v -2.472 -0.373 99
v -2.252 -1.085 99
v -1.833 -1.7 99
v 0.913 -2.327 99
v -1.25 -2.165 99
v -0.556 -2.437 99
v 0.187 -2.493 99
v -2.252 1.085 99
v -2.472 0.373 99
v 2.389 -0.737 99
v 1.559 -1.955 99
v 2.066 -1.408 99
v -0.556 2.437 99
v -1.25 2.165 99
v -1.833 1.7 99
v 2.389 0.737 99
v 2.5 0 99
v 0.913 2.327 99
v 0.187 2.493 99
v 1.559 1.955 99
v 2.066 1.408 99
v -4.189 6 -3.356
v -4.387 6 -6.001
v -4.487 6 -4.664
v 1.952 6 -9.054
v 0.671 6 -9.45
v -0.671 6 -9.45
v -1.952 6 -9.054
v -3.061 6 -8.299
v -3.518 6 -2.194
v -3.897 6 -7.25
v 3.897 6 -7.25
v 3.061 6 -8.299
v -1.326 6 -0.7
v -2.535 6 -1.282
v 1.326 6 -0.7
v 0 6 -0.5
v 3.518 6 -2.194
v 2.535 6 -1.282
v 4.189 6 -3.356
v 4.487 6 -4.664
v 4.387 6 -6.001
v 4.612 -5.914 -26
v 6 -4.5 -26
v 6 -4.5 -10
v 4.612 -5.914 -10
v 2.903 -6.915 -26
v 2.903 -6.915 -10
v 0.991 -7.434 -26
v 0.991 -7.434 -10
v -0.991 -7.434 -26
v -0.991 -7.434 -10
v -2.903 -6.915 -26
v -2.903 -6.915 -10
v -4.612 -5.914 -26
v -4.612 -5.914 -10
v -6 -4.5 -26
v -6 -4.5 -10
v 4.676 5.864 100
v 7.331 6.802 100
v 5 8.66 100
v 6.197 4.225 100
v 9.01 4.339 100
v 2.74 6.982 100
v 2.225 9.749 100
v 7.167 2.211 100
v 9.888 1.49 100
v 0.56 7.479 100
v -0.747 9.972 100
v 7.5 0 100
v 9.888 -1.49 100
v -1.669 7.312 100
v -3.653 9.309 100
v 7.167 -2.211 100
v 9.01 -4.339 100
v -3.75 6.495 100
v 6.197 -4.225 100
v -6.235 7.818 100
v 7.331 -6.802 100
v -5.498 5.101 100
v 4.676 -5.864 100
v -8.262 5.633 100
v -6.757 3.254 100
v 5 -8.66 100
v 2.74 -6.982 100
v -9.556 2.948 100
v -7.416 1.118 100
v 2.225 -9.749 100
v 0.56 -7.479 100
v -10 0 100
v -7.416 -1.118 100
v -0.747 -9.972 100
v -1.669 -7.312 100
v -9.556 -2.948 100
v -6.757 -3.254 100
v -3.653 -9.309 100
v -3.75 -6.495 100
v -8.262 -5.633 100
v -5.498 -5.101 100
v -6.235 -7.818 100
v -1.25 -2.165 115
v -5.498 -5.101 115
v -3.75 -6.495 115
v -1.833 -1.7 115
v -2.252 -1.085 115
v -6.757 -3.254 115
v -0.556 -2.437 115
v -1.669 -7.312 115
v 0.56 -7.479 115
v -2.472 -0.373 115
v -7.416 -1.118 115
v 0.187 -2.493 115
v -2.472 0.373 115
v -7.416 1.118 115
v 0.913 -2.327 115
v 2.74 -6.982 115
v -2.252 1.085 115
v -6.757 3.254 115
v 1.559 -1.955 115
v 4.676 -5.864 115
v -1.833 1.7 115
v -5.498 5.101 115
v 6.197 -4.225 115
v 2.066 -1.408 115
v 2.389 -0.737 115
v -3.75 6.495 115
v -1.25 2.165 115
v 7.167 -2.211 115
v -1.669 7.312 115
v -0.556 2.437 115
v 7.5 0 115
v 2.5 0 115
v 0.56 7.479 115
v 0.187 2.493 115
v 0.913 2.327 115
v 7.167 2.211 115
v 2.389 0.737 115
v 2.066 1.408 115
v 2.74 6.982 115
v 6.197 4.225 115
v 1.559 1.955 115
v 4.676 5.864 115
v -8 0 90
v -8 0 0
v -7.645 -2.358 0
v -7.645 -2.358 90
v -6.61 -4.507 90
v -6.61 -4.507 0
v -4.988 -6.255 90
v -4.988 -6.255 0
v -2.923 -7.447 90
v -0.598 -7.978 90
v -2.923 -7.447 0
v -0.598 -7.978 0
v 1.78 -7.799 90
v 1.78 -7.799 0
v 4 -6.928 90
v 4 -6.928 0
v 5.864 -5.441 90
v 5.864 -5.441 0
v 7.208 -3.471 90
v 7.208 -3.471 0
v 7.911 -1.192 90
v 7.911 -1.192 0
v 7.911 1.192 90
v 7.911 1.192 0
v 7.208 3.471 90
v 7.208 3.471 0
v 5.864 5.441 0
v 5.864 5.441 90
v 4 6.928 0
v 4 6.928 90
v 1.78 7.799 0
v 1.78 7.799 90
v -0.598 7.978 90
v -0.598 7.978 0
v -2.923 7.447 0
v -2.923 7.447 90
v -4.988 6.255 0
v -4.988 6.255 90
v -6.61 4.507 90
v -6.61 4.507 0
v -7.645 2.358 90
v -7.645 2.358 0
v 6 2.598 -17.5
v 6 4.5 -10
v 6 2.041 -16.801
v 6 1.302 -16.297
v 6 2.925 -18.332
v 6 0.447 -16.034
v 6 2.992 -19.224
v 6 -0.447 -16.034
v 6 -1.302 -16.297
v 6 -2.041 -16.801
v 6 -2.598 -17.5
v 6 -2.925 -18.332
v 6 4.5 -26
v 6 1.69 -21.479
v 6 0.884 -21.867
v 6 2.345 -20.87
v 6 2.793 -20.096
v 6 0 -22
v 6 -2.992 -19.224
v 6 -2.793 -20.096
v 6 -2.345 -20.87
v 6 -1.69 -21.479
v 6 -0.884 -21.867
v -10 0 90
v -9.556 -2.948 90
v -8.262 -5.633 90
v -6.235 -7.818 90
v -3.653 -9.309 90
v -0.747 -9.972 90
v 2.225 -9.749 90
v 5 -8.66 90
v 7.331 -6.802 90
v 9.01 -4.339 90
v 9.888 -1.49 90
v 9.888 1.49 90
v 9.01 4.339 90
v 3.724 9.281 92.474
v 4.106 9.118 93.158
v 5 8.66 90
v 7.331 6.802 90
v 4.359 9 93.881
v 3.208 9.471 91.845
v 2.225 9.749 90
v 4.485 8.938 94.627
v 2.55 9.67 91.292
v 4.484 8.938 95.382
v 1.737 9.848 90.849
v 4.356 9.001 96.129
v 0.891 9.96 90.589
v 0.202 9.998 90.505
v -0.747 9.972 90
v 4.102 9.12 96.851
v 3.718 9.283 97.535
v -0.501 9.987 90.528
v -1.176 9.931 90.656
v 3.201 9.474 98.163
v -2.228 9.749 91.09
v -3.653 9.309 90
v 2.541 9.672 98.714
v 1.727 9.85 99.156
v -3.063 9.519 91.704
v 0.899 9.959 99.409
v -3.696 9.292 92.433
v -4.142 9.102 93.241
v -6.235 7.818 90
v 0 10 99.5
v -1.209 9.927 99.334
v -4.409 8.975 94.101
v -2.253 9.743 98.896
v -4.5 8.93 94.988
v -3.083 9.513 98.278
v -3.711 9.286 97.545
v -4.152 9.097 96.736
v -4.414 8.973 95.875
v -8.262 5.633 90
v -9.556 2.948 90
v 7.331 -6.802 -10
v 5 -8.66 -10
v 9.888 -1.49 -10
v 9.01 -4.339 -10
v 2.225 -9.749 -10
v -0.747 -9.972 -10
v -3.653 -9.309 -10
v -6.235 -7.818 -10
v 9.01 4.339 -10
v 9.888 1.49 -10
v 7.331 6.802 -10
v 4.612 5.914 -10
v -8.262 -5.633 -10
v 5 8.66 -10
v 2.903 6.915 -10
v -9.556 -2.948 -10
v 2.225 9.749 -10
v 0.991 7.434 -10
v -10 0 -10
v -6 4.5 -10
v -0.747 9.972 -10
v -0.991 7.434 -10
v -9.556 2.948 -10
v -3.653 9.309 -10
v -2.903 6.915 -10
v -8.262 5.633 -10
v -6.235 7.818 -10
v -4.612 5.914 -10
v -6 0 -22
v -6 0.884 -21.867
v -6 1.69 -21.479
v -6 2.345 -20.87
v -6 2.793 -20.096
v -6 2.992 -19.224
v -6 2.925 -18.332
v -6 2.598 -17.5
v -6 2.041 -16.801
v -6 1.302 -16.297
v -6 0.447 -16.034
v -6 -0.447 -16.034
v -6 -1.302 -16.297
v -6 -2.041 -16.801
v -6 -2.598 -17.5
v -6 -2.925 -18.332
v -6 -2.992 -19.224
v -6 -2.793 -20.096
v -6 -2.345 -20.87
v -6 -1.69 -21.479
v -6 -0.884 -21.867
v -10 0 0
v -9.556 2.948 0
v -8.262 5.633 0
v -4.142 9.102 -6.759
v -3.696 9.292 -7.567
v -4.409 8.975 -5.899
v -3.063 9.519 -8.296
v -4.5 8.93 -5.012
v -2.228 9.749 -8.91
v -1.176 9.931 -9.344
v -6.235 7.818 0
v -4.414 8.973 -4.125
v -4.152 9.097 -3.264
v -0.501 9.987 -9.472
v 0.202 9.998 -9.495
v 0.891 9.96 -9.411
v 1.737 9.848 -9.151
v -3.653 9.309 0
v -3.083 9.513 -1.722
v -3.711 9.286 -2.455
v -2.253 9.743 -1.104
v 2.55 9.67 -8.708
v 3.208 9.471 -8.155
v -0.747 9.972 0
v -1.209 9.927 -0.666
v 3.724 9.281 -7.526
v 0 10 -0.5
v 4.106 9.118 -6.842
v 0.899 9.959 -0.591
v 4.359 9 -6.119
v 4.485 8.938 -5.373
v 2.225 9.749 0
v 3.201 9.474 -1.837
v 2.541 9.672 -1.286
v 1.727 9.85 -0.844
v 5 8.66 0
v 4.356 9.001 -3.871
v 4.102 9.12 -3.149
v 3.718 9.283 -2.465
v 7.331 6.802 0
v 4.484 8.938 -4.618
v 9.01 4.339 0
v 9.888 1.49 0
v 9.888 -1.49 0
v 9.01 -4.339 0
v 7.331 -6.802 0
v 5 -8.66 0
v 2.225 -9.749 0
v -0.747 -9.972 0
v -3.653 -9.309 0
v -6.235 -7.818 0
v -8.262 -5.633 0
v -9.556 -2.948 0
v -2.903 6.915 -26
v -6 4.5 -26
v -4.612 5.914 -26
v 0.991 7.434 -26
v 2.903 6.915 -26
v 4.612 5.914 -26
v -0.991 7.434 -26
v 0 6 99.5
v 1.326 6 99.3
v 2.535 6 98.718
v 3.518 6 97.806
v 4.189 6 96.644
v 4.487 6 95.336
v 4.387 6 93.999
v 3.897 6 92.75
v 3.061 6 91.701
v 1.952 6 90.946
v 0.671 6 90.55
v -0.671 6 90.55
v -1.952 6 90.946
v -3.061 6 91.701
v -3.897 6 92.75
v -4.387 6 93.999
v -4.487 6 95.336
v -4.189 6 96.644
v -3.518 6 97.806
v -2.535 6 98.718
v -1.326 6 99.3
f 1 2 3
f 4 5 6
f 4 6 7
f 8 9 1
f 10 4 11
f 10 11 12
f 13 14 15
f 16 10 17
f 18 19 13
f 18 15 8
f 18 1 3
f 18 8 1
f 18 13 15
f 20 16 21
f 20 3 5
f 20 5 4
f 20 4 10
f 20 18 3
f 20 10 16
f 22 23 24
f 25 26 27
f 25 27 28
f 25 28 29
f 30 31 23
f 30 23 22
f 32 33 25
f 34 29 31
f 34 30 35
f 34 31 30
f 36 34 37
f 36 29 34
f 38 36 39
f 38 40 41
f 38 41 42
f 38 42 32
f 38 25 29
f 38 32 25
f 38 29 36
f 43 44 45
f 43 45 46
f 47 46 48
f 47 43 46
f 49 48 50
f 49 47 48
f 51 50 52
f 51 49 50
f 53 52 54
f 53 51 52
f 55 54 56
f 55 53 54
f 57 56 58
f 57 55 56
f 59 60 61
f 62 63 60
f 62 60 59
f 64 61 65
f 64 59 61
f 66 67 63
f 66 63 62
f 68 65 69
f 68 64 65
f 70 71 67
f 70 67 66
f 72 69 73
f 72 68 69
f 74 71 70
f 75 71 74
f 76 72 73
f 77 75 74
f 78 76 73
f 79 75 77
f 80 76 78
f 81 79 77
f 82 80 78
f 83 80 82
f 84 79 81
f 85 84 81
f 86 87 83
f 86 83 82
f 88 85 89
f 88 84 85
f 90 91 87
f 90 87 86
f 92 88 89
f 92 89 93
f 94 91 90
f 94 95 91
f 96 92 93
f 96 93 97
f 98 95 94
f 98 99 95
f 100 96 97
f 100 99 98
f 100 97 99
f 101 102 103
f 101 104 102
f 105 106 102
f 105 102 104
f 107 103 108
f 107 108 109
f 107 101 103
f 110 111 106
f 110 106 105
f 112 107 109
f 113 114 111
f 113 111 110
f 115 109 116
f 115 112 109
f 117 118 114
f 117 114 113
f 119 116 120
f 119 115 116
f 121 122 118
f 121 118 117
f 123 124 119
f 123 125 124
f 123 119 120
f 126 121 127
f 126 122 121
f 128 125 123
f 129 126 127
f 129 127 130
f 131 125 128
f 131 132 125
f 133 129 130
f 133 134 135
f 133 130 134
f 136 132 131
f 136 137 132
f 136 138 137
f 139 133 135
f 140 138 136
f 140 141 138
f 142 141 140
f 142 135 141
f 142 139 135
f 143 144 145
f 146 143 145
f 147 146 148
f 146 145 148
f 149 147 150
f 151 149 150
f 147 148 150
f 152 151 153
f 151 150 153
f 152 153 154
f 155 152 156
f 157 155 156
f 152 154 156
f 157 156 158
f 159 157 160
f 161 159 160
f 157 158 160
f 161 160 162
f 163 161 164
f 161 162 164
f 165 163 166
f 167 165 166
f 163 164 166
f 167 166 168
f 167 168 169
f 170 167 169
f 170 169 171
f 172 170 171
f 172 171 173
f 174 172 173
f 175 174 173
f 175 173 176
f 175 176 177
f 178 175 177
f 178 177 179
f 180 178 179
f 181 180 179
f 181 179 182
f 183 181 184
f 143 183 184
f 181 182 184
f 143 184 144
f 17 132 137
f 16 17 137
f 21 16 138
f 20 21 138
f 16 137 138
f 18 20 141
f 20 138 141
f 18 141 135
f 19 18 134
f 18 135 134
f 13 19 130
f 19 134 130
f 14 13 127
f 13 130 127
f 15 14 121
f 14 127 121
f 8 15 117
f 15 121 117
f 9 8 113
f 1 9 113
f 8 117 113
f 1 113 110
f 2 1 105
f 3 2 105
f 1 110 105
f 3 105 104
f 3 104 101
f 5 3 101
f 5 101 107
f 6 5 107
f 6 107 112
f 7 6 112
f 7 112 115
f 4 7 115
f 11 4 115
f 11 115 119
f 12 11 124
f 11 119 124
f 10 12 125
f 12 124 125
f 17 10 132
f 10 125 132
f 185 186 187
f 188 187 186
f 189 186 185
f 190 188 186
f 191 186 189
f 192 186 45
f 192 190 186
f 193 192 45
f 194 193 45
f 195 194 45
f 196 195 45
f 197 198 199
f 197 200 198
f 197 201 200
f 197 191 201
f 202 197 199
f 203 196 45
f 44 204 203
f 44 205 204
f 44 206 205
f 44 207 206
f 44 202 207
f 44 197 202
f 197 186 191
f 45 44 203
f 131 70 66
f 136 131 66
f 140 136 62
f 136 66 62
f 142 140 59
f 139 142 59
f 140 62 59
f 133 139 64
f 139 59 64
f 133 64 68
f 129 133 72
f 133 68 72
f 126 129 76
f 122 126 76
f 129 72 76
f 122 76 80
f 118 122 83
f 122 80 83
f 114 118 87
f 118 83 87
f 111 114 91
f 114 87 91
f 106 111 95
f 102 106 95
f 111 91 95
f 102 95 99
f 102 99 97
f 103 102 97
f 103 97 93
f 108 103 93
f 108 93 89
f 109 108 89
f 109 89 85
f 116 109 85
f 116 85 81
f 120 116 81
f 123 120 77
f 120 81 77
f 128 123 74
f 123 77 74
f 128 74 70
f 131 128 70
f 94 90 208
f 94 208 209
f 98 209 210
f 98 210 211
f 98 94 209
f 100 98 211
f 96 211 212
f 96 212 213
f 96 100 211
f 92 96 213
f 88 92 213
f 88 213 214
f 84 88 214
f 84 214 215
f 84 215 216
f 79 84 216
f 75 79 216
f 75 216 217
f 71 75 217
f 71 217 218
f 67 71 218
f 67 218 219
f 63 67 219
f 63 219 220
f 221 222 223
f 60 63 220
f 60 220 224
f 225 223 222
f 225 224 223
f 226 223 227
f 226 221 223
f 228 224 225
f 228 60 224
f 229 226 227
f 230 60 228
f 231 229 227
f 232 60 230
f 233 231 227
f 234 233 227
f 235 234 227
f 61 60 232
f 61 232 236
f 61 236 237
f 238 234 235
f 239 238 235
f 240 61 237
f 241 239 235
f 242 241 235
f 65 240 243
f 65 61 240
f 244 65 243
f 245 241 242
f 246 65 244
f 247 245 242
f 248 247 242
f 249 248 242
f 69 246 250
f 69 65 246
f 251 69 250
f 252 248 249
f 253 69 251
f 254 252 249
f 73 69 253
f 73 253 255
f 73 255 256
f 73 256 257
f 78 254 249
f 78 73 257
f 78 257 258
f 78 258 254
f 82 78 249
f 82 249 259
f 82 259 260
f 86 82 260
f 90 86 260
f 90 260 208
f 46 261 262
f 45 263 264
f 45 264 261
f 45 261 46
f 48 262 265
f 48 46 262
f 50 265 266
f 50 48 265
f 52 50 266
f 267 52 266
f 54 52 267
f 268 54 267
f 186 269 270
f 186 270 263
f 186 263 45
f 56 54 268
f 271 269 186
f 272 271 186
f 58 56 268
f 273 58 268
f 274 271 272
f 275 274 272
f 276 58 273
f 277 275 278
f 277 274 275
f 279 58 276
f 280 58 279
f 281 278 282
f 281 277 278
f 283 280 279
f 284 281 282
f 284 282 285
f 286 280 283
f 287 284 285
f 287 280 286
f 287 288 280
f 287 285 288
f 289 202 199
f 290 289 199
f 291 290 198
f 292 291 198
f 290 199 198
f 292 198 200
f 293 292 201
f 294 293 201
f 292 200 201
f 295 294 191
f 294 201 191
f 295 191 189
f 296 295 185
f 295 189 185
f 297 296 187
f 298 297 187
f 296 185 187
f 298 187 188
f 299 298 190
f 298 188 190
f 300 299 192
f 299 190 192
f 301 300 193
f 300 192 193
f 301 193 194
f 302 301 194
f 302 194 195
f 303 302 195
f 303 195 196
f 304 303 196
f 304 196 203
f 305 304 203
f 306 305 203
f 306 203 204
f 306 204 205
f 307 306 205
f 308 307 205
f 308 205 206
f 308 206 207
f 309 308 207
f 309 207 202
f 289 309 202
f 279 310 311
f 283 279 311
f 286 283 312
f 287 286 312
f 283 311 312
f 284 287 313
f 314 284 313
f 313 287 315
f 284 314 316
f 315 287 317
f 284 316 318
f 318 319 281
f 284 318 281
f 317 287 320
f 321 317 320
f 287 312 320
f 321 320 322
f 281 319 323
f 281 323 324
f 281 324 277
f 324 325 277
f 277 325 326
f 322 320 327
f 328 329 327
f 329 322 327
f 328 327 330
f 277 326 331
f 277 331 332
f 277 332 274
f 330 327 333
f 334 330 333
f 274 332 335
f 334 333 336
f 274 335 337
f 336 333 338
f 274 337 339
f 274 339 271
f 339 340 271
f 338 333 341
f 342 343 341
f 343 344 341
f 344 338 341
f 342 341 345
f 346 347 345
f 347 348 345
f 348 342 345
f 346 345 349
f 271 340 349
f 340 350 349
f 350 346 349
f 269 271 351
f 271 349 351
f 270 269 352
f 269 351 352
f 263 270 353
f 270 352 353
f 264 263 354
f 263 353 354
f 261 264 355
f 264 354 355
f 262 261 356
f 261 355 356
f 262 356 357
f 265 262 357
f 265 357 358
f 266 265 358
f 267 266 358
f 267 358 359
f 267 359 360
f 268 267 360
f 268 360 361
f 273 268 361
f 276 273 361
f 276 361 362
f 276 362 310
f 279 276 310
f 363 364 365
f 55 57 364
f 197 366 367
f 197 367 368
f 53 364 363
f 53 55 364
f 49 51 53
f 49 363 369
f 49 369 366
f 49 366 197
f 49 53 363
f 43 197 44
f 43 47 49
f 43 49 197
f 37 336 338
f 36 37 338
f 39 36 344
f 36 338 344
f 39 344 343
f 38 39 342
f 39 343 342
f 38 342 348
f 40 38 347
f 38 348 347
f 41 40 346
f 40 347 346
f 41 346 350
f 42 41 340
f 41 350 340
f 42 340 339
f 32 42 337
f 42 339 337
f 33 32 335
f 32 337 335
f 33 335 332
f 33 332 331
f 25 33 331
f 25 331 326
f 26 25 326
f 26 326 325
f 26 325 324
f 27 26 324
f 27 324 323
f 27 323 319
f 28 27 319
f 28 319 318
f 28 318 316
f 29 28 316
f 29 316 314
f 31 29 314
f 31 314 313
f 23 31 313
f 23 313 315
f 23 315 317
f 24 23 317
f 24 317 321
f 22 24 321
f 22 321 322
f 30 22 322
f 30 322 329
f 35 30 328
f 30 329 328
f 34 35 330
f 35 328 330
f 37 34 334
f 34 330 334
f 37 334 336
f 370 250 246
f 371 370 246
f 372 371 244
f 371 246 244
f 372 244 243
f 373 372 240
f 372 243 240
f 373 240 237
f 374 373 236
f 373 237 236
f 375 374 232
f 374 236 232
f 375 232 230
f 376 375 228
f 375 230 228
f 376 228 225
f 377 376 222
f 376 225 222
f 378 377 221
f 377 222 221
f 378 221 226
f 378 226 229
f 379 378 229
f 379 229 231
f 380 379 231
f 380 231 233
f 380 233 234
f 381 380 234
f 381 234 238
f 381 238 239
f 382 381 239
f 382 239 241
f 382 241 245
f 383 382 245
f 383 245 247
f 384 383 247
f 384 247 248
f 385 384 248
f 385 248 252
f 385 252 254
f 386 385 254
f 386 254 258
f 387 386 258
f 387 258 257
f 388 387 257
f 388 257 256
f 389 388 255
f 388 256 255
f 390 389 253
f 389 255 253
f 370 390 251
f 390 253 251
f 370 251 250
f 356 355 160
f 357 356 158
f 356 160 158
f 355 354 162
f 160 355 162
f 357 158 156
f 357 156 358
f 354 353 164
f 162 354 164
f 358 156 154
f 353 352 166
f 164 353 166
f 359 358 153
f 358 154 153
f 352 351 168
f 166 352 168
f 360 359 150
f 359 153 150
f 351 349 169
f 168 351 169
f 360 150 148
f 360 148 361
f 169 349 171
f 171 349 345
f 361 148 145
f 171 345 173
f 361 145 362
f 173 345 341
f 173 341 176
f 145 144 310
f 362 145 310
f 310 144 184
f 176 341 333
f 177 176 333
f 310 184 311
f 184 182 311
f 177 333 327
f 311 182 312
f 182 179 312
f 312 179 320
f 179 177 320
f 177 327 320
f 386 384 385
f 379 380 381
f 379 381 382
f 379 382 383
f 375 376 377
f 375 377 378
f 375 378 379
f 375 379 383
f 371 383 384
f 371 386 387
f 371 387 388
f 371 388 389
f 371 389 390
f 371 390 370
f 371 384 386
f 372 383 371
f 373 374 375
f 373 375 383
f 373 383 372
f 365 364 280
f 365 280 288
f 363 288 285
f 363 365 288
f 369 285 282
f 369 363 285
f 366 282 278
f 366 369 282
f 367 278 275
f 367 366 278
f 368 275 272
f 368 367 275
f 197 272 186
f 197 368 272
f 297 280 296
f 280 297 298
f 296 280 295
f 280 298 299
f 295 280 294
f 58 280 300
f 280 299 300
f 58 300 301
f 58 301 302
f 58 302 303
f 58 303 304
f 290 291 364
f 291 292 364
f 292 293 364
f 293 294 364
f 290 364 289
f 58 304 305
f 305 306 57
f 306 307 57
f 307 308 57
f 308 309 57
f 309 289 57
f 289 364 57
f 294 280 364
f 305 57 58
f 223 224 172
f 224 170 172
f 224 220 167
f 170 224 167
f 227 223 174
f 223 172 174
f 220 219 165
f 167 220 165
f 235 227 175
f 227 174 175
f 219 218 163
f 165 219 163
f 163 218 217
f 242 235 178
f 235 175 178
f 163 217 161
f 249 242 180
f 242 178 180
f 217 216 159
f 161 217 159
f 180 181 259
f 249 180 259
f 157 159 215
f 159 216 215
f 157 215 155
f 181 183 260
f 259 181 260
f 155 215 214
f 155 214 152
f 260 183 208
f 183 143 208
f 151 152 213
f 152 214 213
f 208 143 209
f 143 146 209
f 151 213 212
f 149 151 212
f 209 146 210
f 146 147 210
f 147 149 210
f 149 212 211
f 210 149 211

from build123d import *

# Parameters (mm, degrees)
SKETCH1_R           = 8
BOSS_EXTRUDE1_DEPTH = 90
SKETCH2_R           = 10
BOSS_EXTRUDE2_DEPTH = 10
BOSS_EXTRUDE3_START = 10
SKETCH3_R           = 10
BOSS_EXTRUDE3_DEPTH = 10
SKETCH4_R           = 7.5
BOSS_EXTRUDE4_DEPTH = 15
BOSS_EXTRUDE5_START = 16
SKETCH5_R           = 7.5
BOSS_EXTRUDE5_DEPTH = 16
SKETCH6_R           = 2.5
CUT_EXTRUDE1_DEPTH  = 16
SKETCH7_R           = 4.5
CUT_EXTRUDE2_DEPTH  = 4
CUT_EXTRUDE3_DEPTH  = 16
SKETCH9_R           = 3
CUT_EXTRUDE4_DEPTH  = 117.53754762


with BuildPart() as part:
    # Sketch1 → Boss-Extrude1 (new body)
    with BuildSketch(Plane.XY):
        with Locations(Location((0, 0, 0), (0, 0, 180))):
            Circle(SKETCH1_R)
    extrude(amount=BOSS_EXTRUDE1_DEPTH)

    # Sketch2 → Boss-Extrude2 (add)
    with BuildSketch(Plane(origin=(0, 0, 0), x_dir=(-1, 0, 0), z_dir=(0, 0, -1))):
        Circle(SKETCH2_R)
    extrude(amount=BOSS_EXTRUDE2_DEPTH)

    # Sketch3 → Boss-Extrude3 (add)
    with BuildSketch(Plane.XY.offset(90).offset(BOSS_EXTRUDE3_START)):
        with Locations(Location((0, 0, 0), (0, 0, 180))):
            Circle(SKETCH3_R)
    extrude(amount=-BOSS_EXTRUDE3_DEPTH)

    # Sketch4 → Boss-Extrude4 (add)
    with BuildSketch(Plane.XY.offset(100)):
        Circle(SKETCH4_R)
    extrude(amount=BOSS_EXTRUDE4_DEPTH)

    # Sketch5 → Boss-Extrude5 (add)
    with BuildSketch(Plane(origin=(0, 0, -10), x_dir=(-1, 0, 0), z_dir=(0, 0, -1)).offset(BOSS_EXTRUDE5_START)):
        with Locations(Location((0, 0, 0), (0, 0, 180))):
            Circle(SKETCH5_R)
    extrude(amount=-BOSS_EXTRUDE5_DEPTH)

    # Sketch6 → Cut-Extrude1 (cut)
    with BuildSketch(Plane.XY.offset(115)):
        Circle(SKETCH6_R)
    extrude(amount=-CUT_EXTRUDE1_DEPTH, mode=Mode.SUBTRACT)

    # Sketch7 → Cut-Extrude2 (cut)
    with BuildSketch(Plane(origin=(0, 10, 0), x_dir=(-1, 0, 0), z_dir=(0, 1, 0))):
        with Locations(Location((0, 95, 0), (0, 0, 90))):
            Circle(SKETCH7_R)
        with Locations(Location((0, -5, 0), (0, 0, 90))):
            Circle(SKETCH7_R)
    extrude(amount=-CUT_EXTRUDE2_DEPTH, mode=Mode.SUBTRACT)

    # Sketch8 → Cut-Extrude3 (cut)
    with BuildSketch(Plane(origin=(0, 0, -26), x_dir=(-1, 0, 0), z_dir=(0, 0, -1))):
        with BuildLine():
            Line((-6, 4.5), (-6, -4.5))
            ThreePointArc((-6, -4.5), (-7.5, 0), (-6, 4.5))
        make_face()
        with BuildLine():
            Line((6, 4.5), (6, -4.5))
            ThreePointArc((6, -4.5), (7.5, 0), (6, 4.5))
        make_face()
    extrude(amount=-CUT_EXTRUDE3_DEPTH, mode=Mode.SUBTRACT)

    # Sketch9 → Cut-Extrude4 (cut, through all)
    with BuildSketch(Plane(origin=(6, 0, 0), x_dir=(0, 0, -1), z_dir=(1, 0, 0))):
        with Locations((19, 0)):
            Circle(SKETCH9_R)
    extrude(amount=-CUT_EXTRUDE4_DEPTH, mode=Mode.SUBTRACT)


solid = part.part
